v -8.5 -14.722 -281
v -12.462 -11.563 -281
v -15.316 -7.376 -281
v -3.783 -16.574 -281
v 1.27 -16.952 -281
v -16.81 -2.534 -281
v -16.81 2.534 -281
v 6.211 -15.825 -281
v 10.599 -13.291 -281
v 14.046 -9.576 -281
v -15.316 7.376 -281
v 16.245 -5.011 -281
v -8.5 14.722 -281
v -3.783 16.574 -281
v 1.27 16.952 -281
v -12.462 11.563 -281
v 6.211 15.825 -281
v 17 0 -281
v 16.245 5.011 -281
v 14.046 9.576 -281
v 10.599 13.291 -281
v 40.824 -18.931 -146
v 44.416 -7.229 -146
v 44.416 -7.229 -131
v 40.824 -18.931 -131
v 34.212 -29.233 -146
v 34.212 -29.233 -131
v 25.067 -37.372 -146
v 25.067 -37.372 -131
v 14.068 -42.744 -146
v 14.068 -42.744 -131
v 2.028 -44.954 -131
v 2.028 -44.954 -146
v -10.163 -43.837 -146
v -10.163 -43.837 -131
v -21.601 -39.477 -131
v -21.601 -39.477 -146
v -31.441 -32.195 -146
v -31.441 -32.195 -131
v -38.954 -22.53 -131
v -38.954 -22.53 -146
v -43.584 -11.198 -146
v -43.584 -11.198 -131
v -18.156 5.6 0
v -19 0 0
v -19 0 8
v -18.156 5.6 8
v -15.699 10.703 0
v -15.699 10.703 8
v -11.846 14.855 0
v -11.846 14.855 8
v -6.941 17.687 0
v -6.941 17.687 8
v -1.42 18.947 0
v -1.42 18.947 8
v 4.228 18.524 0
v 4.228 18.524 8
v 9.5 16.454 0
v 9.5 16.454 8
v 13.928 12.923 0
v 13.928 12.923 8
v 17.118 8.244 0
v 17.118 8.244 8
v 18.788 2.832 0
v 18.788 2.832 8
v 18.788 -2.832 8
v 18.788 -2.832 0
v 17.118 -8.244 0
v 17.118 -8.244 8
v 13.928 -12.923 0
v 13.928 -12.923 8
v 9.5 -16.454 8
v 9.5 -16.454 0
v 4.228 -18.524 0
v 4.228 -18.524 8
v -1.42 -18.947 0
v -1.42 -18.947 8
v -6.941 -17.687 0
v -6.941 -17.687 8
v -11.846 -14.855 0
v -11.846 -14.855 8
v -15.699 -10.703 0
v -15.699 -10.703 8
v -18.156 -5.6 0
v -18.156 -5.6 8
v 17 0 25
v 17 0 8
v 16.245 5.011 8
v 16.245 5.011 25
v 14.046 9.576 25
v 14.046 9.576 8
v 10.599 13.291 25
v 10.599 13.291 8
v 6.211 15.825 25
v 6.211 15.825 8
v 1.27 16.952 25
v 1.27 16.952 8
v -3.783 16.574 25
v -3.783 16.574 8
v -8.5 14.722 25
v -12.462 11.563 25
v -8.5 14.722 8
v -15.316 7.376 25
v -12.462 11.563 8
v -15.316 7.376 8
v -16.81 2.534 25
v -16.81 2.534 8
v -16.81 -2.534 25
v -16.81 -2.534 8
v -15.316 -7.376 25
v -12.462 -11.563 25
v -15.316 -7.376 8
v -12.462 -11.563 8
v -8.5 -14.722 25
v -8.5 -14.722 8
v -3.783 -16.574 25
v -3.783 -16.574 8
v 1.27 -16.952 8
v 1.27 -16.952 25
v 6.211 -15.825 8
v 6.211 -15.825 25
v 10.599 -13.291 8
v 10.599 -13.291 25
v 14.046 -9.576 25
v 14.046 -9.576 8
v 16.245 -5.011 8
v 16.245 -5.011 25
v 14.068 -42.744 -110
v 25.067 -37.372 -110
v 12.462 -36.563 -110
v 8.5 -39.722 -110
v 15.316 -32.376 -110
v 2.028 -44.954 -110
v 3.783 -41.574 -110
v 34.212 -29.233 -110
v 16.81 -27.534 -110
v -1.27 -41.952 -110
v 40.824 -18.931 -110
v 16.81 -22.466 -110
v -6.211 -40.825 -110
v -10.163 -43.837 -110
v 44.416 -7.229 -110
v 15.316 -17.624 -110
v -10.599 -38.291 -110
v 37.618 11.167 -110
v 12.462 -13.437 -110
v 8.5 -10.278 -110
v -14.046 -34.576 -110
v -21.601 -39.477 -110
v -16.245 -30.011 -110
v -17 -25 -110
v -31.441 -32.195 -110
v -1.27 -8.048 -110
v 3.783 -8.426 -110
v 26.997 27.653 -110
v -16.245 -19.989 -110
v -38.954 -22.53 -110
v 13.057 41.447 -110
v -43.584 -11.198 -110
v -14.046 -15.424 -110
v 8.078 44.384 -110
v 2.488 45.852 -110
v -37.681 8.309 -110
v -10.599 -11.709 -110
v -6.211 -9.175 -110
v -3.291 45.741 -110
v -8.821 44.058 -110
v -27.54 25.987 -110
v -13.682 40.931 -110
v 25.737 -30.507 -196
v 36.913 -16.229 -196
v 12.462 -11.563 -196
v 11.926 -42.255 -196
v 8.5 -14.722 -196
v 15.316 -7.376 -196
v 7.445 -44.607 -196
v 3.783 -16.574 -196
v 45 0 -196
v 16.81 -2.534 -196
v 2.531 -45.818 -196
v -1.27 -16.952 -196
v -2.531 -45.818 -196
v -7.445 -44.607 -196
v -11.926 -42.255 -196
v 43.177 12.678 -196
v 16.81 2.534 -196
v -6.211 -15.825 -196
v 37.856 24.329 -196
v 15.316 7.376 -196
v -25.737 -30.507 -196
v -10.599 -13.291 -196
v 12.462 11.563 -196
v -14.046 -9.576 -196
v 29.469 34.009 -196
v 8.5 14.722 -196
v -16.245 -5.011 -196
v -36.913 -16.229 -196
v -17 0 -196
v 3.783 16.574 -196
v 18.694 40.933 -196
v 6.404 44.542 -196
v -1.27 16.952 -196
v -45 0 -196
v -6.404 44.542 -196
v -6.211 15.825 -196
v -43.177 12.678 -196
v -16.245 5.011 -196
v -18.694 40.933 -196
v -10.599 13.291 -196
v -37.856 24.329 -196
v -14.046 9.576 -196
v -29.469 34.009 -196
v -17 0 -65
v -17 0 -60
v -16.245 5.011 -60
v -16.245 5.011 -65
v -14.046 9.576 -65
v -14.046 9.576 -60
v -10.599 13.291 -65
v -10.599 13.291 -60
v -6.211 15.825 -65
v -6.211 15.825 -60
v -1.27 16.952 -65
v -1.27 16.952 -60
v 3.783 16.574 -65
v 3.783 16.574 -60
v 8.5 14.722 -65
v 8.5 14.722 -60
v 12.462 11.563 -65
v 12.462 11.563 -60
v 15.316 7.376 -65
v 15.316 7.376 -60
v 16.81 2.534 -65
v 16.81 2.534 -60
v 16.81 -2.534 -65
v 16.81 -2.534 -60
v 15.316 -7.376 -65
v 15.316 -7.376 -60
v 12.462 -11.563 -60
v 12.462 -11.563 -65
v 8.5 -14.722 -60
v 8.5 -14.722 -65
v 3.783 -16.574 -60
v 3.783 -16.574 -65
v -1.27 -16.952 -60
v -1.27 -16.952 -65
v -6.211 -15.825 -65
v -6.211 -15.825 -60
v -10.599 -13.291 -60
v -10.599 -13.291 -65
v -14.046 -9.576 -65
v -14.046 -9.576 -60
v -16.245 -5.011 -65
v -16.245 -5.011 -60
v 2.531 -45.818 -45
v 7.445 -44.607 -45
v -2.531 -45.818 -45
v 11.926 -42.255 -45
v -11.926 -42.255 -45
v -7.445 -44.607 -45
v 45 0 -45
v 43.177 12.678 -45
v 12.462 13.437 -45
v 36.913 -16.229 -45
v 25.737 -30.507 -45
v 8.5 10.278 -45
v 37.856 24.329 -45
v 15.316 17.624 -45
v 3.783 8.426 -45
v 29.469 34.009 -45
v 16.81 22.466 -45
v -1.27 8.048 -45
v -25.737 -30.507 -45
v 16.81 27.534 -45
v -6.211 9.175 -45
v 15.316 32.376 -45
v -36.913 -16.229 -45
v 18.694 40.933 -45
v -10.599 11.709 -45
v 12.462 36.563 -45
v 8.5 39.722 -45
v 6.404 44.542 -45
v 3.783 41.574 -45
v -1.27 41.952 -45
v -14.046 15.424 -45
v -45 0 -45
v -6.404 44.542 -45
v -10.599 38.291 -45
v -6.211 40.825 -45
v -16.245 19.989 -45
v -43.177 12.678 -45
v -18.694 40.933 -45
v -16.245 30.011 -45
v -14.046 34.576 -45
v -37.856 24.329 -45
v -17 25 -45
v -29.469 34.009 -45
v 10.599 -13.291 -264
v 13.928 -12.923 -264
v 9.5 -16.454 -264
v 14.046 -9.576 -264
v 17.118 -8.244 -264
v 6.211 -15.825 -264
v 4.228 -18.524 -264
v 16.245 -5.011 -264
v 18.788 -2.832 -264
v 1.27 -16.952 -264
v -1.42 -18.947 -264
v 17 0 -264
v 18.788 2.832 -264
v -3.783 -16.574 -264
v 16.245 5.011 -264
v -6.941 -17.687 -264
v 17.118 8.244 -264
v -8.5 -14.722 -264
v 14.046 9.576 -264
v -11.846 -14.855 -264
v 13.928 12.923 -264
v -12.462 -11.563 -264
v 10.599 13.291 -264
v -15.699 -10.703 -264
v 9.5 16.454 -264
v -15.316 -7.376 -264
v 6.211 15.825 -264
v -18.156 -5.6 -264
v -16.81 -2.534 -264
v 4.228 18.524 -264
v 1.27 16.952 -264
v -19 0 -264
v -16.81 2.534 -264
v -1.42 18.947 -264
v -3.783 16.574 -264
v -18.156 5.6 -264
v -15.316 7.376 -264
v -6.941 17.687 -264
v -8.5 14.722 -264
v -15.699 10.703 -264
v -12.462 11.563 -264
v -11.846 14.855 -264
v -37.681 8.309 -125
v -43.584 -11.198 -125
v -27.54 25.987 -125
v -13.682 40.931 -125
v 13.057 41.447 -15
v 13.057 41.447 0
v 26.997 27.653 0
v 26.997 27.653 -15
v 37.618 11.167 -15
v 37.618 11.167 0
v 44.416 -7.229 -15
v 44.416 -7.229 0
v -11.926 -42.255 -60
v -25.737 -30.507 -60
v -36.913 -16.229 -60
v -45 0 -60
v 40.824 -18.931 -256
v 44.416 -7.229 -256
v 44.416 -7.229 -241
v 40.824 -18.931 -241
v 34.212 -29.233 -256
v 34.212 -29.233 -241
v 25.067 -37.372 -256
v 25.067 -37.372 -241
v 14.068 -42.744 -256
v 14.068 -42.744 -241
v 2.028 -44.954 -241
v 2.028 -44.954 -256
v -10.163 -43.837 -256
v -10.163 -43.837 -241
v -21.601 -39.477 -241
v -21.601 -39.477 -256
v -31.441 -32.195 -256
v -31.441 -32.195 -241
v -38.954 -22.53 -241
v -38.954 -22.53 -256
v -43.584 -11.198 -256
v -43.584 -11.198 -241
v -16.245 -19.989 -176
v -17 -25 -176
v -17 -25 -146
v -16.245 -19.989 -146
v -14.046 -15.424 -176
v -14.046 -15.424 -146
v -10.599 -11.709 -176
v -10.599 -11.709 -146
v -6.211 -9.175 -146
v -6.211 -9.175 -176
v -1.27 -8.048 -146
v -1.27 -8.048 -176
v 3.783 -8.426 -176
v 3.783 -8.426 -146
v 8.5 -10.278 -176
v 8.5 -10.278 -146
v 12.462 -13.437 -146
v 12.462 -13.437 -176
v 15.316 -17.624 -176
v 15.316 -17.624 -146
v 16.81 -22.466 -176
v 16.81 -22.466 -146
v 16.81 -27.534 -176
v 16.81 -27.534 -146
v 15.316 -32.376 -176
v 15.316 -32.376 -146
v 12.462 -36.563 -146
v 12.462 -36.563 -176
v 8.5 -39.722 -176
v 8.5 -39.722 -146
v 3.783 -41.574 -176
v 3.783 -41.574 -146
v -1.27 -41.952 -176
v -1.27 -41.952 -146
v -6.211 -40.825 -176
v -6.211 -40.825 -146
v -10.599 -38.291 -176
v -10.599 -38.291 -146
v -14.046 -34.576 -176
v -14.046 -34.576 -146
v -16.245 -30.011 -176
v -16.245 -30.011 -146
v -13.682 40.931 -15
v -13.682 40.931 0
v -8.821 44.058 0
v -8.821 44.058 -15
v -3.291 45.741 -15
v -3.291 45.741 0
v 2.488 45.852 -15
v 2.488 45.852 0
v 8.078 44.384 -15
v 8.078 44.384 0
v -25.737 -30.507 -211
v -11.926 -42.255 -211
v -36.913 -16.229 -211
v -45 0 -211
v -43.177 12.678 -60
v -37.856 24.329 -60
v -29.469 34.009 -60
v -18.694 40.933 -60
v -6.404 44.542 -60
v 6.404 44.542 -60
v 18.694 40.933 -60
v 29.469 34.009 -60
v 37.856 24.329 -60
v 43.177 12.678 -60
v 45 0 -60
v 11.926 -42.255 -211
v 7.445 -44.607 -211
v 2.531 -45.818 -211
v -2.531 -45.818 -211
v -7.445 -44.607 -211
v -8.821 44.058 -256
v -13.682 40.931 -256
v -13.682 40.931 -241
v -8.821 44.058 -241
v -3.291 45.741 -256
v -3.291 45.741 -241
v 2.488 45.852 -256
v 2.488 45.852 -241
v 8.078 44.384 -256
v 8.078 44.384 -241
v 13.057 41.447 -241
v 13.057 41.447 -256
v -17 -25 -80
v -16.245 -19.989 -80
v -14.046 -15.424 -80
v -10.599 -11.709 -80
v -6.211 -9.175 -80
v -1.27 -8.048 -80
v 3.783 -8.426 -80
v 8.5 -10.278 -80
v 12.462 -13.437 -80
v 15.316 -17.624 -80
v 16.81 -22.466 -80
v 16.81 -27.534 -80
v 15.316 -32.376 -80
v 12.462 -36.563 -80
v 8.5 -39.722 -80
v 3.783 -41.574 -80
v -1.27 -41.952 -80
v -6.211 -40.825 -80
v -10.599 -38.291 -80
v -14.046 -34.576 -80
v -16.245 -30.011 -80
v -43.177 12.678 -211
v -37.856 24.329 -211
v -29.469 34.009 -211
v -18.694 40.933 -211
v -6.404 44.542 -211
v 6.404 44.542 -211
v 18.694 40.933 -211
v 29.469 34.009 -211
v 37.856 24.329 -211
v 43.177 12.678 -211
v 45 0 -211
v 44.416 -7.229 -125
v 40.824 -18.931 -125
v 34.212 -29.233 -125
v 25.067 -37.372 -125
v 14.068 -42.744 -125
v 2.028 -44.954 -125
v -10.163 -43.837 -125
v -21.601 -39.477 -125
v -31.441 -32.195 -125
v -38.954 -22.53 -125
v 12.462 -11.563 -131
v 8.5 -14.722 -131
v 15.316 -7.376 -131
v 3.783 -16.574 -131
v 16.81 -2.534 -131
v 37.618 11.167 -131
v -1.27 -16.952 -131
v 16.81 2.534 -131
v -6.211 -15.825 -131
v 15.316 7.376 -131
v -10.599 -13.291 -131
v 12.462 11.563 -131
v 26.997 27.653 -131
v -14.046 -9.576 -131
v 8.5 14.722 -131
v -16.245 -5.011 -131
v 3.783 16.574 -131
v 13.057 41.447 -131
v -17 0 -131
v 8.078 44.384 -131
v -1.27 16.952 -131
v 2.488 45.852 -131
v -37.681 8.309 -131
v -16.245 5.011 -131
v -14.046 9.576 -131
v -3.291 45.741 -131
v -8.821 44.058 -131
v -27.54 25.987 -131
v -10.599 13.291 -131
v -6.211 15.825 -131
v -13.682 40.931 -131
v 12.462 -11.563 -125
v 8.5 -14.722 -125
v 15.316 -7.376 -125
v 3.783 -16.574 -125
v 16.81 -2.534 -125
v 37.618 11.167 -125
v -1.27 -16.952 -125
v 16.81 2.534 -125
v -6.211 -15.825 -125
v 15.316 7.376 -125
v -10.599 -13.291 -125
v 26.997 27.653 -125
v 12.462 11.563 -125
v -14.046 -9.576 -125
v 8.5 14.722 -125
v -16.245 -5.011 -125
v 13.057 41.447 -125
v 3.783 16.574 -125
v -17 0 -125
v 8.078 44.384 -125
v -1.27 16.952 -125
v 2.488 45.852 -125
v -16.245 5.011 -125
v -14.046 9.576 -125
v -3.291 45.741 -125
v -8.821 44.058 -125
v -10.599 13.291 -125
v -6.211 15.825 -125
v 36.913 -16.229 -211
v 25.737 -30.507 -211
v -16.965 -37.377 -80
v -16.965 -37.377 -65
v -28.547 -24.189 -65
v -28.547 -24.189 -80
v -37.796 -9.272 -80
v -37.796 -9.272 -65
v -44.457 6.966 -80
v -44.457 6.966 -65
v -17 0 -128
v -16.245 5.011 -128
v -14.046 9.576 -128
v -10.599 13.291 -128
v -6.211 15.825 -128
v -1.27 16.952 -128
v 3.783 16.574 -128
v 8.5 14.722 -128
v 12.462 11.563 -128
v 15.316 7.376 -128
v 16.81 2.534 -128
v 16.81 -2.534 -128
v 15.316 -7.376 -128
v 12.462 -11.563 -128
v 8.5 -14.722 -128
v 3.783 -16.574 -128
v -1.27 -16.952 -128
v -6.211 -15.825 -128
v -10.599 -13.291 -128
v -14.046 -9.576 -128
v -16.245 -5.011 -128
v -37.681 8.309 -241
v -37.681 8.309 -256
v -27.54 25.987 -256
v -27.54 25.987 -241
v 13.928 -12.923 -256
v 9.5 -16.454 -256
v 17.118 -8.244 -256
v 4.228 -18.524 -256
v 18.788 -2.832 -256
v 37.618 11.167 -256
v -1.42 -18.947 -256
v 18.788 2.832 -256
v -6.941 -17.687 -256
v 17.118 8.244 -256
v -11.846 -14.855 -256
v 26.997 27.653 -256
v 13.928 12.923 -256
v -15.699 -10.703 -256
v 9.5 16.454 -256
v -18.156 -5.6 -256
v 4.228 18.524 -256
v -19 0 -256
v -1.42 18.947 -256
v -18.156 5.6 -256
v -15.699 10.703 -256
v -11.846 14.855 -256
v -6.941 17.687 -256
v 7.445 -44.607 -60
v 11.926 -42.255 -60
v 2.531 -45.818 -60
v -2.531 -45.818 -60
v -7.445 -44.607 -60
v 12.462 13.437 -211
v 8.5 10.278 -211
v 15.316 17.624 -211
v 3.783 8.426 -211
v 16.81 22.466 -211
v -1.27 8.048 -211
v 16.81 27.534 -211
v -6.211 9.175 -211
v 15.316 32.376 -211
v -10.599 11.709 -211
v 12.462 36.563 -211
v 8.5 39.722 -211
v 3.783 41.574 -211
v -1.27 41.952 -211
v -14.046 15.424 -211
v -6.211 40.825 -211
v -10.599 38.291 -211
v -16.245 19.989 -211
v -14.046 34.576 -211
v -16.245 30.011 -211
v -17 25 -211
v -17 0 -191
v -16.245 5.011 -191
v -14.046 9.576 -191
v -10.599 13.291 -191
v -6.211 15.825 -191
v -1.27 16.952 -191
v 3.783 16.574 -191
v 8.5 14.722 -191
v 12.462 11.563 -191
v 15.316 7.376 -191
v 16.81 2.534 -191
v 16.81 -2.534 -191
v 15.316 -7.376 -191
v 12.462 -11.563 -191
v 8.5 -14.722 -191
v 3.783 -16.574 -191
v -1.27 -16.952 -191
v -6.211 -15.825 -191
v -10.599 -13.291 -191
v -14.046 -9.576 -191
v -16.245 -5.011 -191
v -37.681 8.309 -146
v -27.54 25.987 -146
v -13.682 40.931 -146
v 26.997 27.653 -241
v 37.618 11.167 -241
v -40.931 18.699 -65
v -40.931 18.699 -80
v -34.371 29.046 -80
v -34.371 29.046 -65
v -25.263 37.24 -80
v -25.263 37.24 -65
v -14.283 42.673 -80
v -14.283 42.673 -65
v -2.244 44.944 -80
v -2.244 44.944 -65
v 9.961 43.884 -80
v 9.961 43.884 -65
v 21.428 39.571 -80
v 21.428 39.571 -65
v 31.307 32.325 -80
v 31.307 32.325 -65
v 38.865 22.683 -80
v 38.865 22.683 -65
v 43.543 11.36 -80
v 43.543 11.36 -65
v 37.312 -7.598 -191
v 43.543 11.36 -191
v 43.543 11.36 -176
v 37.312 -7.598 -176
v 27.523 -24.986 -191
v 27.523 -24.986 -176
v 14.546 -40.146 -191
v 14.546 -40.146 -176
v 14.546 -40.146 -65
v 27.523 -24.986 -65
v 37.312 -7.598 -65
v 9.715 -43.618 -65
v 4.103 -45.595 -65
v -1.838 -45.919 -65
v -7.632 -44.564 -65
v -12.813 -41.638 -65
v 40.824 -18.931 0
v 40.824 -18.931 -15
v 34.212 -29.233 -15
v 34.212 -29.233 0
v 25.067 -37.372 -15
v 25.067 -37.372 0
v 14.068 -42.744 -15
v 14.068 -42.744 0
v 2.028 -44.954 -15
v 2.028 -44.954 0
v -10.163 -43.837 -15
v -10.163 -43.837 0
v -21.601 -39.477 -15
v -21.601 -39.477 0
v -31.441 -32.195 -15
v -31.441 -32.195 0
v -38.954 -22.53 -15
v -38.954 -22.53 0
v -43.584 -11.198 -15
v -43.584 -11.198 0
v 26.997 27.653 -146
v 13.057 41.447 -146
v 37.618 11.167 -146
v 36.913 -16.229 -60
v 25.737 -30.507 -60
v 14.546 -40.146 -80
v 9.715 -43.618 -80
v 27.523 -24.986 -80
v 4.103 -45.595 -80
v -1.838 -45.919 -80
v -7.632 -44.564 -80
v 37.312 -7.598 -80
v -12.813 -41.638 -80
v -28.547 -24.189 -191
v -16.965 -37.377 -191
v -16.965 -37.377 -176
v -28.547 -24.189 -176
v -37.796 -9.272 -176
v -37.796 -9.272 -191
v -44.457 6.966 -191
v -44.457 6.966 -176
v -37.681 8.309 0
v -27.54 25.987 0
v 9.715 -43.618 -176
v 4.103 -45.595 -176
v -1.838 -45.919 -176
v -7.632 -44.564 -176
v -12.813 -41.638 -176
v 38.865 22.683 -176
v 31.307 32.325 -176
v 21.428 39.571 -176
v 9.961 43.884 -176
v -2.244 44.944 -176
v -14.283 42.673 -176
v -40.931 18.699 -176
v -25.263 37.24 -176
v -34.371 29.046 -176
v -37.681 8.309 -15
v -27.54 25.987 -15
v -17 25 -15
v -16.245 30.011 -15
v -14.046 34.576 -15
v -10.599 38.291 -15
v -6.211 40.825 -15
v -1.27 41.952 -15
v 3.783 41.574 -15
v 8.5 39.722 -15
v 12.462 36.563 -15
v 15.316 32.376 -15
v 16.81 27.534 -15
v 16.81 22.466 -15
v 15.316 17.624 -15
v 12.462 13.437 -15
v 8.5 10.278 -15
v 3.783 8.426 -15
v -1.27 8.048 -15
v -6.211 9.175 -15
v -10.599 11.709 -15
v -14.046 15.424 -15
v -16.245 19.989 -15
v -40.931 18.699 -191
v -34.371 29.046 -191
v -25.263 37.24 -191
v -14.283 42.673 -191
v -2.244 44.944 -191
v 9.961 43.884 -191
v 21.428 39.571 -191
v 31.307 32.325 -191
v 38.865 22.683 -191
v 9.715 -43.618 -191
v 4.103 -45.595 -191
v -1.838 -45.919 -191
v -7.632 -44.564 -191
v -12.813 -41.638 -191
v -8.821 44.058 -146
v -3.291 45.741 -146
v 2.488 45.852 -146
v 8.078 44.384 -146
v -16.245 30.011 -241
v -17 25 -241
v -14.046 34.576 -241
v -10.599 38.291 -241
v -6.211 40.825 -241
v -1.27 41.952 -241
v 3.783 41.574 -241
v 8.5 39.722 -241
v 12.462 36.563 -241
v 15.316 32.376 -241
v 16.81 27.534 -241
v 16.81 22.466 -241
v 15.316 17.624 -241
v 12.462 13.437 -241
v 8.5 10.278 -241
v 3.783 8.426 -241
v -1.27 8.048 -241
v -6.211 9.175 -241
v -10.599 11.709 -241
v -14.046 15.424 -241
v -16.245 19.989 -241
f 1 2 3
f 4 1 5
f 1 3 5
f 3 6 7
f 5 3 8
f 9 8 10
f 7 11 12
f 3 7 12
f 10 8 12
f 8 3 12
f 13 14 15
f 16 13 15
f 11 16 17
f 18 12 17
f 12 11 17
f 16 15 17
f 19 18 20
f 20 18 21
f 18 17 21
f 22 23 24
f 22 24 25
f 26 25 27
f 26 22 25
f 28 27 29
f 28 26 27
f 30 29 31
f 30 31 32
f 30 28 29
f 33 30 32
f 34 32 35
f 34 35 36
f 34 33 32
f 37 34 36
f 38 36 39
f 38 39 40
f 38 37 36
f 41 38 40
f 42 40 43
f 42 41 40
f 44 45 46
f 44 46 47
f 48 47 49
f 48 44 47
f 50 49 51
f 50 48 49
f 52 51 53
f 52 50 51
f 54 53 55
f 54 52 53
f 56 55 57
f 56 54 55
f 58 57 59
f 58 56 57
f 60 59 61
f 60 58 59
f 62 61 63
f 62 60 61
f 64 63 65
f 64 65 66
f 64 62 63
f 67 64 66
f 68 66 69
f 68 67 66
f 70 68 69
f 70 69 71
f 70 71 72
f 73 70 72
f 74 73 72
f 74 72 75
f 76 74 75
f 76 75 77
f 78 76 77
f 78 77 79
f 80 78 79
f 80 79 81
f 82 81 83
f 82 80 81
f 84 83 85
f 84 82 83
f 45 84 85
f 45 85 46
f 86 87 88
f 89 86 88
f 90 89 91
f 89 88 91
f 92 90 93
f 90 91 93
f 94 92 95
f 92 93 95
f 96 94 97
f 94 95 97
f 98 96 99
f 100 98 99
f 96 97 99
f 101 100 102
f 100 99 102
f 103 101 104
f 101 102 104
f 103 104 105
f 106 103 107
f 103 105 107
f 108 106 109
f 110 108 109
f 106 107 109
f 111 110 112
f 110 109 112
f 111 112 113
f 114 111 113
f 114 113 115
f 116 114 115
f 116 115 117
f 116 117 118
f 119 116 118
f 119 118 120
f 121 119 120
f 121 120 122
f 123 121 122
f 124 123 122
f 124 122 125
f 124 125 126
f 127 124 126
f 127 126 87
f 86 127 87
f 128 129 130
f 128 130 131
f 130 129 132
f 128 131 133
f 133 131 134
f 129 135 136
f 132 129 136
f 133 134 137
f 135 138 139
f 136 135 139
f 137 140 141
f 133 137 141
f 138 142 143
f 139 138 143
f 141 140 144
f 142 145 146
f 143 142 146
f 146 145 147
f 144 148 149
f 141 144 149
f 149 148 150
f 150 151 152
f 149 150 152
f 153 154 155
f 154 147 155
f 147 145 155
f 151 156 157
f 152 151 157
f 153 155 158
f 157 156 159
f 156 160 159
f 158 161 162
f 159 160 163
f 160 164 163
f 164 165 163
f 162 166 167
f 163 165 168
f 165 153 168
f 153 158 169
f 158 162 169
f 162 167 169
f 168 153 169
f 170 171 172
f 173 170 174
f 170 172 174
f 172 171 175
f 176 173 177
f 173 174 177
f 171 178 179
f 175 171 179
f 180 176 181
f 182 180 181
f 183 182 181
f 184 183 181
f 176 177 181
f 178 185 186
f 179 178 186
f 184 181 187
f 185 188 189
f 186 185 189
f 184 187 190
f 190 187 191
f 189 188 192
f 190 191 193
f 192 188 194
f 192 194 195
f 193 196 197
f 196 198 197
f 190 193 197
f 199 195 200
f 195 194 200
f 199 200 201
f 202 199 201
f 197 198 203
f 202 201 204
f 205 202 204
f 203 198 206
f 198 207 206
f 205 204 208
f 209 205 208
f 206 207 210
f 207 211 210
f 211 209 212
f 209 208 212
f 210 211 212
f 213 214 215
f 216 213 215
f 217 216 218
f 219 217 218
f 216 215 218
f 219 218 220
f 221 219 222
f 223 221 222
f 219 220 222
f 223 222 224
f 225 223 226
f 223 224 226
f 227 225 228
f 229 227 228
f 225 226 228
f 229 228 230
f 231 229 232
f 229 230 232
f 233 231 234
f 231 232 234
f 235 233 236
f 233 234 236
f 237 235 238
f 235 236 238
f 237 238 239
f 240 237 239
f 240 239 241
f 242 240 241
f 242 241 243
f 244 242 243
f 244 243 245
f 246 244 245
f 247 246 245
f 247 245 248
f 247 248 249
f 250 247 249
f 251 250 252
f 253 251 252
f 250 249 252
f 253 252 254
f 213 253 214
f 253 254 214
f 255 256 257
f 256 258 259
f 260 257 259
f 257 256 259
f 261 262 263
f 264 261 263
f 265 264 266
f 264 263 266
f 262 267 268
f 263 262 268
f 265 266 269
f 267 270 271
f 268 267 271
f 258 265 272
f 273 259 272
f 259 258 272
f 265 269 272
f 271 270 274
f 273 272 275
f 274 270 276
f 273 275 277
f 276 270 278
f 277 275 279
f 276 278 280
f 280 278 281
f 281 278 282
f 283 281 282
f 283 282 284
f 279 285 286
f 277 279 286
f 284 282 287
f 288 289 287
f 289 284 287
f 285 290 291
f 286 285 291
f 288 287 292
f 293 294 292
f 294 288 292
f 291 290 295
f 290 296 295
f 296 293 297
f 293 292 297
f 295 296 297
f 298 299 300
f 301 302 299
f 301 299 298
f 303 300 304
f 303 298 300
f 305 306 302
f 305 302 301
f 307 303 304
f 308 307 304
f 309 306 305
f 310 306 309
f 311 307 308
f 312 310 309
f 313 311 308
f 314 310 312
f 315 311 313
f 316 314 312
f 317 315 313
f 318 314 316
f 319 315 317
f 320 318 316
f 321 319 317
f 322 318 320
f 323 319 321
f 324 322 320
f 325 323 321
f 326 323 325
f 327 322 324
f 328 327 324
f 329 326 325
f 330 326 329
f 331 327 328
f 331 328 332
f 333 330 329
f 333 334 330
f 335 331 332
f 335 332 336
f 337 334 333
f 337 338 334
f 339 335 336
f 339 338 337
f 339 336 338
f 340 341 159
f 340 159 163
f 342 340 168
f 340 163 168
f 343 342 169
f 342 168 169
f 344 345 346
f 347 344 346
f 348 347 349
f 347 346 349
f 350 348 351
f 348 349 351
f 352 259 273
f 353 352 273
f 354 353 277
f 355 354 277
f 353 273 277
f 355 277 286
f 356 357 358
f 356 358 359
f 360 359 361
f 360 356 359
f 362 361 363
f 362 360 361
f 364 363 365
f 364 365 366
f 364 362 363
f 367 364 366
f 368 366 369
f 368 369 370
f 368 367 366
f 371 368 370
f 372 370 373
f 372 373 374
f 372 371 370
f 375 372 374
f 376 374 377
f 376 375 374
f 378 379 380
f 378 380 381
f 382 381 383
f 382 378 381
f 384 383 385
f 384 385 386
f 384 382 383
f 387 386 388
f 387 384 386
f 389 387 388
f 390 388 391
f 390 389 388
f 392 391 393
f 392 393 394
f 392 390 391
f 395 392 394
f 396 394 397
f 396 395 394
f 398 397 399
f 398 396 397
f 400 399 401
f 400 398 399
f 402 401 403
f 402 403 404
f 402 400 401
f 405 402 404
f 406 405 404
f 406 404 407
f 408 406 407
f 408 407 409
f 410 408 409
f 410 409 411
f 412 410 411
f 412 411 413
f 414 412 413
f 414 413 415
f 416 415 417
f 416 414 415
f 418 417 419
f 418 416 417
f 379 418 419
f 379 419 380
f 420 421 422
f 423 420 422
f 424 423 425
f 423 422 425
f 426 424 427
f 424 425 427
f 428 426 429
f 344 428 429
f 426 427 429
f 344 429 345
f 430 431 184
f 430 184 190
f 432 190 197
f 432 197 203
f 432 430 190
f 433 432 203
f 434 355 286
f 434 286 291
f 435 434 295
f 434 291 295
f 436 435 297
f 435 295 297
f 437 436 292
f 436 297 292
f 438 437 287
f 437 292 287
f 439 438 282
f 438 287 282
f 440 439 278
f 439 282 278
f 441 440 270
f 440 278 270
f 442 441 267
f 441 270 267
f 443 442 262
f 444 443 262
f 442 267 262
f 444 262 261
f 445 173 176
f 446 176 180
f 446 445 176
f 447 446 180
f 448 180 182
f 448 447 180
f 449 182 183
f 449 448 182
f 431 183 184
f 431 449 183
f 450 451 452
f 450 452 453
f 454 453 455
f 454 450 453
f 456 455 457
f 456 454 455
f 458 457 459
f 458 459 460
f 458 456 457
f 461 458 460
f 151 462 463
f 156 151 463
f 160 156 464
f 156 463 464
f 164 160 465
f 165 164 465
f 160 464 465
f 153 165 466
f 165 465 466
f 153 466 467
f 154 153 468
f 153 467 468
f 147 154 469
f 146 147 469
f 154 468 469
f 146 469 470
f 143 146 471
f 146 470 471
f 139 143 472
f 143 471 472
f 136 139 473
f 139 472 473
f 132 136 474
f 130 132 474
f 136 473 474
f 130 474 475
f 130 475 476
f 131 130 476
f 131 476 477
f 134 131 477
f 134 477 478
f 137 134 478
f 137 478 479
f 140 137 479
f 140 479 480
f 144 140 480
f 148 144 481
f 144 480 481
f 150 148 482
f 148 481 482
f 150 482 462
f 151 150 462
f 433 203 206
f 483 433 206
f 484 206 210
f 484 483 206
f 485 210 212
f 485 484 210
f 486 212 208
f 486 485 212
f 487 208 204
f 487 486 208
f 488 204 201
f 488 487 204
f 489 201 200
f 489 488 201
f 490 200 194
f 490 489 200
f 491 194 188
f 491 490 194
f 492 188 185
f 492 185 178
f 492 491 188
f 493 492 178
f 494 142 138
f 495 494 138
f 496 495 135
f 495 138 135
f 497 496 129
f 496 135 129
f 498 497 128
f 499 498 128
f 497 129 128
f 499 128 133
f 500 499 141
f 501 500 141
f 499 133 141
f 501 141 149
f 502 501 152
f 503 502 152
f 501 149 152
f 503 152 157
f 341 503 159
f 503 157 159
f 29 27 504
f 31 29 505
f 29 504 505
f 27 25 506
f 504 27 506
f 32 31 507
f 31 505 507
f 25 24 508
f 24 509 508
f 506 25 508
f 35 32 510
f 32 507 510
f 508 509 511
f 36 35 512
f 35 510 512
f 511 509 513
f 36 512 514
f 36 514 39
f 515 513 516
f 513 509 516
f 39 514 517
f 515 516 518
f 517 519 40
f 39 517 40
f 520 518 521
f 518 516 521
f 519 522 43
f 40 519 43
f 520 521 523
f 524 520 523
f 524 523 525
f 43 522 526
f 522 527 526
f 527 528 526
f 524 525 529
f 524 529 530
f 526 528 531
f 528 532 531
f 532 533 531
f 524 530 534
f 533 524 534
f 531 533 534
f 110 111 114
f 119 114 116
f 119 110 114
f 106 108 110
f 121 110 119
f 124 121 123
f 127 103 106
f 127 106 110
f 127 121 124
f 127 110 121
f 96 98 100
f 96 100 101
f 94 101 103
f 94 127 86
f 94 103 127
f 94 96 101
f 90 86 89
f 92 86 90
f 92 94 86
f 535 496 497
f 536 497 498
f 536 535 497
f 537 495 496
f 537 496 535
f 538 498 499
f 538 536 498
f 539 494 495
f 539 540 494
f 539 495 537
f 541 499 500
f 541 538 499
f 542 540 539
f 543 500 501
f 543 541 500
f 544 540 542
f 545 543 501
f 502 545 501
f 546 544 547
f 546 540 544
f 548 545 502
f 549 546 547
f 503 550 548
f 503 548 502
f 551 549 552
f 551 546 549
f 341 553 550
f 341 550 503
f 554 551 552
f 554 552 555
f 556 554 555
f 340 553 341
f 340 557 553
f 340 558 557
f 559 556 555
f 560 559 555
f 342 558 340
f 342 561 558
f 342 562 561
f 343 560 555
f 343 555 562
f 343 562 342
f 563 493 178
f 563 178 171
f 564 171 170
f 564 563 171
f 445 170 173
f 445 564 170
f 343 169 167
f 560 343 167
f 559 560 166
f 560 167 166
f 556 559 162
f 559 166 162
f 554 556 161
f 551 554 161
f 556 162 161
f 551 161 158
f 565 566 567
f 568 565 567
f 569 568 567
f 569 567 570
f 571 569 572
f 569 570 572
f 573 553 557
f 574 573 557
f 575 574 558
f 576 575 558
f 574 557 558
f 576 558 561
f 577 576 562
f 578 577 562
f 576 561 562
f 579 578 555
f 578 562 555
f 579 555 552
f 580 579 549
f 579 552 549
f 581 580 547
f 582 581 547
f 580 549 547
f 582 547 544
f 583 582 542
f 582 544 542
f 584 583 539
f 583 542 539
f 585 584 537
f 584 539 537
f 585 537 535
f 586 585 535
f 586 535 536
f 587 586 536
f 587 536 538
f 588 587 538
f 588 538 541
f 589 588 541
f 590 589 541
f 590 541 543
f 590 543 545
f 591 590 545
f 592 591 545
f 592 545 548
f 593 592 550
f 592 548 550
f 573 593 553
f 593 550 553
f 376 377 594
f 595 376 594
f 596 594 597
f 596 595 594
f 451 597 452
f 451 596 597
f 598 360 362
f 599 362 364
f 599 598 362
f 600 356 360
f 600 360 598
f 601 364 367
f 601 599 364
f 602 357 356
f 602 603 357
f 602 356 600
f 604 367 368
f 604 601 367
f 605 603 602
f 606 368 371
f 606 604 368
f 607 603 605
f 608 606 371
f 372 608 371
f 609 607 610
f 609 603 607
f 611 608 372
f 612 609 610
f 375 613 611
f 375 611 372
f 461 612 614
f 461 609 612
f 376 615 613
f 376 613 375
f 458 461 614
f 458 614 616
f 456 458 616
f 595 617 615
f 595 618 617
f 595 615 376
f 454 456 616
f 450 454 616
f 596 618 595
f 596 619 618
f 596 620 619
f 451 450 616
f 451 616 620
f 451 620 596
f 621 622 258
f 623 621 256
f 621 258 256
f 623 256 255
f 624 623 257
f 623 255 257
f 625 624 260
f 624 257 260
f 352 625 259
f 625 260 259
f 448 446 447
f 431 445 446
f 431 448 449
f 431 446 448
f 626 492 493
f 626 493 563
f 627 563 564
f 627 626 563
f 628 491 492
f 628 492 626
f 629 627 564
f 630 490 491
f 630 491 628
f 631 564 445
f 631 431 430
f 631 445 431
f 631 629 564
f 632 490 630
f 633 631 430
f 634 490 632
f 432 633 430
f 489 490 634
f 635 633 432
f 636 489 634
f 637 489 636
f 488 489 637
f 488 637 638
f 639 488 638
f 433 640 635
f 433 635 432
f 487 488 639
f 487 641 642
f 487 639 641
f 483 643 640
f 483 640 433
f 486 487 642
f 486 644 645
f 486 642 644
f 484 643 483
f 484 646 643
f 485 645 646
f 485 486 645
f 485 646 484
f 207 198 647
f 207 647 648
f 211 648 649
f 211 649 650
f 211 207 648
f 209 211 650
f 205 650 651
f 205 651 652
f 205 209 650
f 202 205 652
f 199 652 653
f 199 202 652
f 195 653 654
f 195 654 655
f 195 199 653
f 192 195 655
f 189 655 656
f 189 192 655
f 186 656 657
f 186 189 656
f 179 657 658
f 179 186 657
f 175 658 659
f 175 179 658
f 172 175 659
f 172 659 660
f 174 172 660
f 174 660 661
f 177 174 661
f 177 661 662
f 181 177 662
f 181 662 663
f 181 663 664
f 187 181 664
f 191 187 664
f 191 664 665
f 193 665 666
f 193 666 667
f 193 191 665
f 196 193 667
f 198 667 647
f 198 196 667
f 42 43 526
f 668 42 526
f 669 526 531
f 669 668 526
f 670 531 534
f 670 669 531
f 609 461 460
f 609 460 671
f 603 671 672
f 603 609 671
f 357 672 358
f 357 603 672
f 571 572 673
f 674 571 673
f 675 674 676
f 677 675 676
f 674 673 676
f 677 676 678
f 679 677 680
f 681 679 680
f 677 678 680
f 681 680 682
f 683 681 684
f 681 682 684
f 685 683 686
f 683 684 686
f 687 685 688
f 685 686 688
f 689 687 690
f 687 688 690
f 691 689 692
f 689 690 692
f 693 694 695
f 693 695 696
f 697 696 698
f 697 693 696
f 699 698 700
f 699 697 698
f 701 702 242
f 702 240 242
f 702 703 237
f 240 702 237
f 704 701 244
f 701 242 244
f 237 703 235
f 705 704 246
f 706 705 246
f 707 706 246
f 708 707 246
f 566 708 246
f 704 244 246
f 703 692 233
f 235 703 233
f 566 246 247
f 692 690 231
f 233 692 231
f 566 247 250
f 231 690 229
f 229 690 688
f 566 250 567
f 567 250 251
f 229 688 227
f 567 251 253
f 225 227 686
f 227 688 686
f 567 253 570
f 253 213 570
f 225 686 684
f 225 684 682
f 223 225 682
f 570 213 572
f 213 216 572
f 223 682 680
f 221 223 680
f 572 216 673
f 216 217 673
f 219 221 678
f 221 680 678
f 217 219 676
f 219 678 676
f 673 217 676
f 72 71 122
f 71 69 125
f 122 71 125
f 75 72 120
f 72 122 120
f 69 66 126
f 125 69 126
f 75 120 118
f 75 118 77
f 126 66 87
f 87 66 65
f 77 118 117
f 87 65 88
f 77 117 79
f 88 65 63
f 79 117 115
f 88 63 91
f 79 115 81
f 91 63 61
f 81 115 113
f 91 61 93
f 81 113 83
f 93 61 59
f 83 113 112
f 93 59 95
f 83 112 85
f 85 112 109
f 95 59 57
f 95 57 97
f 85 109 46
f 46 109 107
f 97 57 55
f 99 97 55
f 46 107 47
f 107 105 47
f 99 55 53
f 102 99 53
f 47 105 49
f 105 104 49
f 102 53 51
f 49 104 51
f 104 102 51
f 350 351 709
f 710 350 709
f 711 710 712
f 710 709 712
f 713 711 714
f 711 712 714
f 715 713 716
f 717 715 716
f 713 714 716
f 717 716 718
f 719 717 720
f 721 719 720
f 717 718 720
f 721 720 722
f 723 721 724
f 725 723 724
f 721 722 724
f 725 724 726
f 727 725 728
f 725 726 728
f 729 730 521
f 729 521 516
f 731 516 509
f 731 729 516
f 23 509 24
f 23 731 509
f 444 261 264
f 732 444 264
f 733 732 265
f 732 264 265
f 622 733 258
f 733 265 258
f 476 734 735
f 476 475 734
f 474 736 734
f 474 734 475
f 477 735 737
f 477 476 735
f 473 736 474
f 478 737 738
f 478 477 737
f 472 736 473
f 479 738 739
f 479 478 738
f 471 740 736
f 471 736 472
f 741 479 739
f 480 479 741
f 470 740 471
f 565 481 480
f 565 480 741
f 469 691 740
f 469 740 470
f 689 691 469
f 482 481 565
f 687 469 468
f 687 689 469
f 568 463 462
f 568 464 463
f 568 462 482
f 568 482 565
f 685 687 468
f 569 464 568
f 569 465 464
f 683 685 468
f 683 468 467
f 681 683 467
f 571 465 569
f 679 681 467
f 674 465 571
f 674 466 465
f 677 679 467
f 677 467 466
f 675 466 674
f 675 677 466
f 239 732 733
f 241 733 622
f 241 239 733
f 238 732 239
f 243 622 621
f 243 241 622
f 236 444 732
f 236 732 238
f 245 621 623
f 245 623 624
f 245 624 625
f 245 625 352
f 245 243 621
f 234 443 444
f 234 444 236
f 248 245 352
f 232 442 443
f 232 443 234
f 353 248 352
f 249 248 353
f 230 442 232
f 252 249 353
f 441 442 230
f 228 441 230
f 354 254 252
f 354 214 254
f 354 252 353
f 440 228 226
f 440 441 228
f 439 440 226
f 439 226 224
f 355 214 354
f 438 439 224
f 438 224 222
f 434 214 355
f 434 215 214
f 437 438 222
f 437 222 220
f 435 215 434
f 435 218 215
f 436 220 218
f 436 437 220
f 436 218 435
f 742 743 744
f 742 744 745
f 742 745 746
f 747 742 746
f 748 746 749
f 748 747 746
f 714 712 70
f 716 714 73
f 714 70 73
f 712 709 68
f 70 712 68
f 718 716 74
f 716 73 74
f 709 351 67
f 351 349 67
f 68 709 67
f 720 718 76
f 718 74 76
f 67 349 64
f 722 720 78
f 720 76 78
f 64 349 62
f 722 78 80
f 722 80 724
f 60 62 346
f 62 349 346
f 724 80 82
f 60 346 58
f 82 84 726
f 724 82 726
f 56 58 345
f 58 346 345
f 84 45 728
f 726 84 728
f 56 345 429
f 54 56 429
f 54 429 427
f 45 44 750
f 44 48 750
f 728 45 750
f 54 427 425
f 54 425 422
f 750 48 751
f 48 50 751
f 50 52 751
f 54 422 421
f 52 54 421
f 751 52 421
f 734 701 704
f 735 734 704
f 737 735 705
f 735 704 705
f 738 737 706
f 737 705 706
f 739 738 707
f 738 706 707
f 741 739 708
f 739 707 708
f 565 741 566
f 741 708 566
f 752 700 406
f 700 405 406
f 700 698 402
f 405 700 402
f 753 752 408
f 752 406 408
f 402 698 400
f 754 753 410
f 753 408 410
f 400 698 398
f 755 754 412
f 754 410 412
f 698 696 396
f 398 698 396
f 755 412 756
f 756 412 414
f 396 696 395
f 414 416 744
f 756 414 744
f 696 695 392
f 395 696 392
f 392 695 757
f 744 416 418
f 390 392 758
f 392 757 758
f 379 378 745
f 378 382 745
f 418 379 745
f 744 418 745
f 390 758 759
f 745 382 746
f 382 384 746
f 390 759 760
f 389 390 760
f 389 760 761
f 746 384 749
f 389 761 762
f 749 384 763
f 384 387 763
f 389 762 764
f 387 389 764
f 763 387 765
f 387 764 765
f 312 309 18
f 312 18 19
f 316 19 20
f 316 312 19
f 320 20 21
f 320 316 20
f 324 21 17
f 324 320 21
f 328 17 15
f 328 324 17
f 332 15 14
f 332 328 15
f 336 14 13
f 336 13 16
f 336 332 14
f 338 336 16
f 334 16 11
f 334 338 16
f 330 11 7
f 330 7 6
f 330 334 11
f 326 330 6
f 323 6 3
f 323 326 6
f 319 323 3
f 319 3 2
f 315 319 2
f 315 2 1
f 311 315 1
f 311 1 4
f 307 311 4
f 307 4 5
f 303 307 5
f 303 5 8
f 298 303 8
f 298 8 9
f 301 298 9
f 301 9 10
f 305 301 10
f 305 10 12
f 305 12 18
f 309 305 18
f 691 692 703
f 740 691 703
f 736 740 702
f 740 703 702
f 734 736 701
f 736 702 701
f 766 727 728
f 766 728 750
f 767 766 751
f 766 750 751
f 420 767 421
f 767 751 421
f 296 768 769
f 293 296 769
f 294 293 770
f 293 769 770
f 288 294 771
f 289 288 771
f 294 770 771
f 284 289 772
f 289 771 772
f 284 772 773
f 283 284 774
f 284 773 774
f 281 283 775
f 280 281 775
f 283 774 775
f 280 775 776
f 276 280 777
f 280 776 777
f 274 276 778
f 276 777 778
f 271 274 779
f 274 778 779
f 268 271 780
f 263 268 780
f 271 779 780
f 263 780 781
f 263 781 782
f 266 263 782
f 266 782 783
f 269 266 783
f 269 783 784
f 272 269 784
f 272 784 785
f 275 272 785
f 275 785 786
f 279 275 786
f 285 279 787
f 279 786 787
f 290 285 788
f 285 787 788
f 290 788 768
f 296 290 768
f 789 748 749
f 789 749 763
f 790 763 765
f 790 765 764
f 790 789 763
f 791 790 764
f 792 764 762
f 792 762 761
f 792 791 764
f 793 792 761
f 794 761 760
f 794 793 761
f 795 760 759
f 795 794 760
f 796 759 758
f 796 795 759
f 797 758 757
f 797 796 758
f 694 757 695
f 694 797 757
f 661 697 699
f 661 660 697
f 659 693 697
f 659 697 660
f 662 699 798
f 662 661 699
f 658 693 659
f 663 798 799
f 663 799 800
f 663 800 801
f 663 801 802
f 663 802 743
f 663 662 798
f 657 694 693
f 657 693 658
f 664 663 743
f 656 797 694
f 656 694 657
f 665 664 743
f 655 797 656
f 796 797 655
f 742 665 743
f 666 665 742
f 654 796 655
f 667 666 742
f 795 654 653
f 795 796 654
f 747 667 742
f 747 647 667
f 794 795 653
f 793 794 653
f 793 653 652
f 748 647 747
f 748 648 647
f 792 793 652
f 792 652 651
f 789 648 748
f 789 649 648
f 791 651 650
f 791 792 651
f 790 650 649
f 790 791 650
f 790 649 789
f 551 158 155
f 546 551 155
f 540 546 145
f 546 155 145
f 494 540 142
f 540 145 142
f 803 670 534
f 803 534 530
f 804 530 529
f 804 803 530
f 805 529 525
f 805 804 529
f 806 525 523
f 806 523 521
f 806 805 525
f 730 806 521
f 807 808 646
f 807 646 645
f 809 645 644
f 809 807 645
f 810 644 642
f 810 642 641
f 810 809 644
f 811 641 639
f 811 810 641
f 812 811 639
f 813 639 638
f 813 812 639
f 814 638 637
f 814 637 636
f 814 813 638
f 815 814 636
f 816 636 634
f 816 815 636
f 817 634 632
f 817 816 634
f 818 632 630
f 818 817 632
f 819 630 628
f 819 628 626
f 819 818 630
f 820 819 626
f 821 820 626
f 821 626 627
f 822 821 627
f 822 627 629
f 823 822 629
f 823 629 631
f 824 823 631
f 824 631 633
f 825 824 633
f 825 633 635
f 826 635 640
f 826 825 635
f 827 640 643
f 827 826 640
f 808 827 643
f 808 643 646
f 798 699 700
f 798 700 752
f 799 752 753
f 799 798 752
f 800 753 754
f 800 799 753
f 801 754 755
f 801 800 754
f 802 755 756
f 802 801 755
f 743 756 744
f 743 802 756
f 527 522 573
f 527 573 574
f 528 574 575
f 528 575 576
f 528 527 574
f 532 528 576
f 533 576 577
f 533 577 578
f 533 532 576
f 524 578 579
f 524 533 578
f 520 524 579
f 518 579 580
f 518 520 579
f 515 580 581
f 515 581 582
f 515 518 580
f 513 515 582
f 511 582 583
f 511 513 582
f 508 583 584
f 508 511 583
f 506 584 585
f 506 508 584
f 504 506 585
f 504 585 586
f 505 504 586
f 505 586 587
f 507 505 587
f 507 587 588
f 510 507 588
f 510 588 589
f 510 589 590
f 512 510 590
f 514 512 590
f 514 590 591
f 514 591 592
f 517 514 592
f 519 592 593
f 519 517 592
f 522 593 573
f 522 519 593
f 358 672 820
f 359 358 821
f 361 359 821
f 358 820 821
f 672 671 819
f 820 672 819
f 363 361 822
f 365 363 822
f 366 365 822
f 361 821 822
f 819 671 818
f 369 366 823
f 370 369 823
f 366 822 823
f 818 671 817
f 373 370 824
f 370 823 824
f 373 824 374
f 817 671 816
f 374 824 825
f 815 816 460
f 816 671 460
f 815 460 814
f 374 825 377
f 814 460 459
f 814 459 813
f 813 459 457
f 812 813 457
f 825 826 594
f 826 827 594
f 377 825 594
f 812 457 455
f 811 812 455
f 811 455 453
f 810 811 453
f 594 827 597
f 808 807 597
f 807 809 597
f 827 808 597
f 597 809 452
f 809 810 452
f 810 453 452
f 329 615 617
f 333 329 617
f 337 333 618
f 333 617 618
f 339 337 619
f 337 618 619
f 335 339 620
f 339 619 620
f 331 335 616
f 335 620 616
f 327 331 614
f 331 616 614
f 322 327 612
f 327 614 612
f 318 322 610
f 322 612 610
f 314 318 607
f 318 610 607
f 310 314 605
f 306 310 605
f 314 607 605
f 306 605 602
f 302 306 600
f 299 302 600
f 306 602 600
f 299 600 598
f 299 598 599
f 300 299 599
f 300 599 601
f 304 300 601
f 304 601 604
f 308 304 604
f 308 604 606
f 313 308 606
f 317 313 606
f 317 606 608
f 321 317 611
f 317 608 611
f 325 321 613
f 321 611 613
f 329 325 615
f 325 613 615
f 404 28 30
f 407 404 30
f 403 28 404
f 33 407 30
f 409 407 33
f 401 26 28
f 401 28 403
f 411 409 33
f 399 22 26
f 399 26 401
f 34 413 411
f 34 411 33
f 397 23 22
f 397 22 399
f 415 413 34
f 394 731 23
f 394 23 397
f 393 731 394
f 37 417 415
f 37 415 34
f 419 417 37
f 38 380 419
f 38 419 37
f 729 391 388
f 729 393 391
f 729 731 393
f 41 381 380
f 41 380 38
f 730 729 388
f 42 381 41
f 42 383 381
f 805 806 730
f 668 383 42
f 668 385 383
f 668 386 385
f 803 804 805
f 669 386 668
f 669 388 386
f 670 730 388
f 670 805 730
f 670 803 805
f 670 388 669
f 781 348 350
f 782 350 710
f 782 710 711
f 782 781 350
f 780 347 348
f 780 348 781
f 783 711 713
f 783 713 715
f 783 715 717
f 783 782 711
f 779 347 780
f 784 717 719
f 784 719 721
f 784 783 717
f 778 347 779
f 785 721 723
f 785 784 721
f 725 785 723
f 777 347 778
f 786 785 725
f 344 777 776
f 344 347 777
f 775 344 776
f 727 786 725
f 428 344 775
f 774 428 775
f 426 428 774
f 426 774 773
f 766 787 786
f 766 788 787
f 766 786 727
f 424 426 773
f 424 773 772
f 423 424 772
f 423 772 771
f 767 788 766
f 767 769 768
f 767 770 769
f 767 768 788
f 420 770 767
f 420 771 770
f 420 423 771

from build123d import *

# Parameters (mm, degrees)
IZIM1_R                      = 17
Y_KSEKLIK_EKSTR_ZYON1_DEPTH  = 25
IZIM2_R                      = 19
Y_KSEKLIK_EKSTR_ZYON2_DEPTH  = 8
Y_KSEKLIK_EKSTR_ZYON3_DEPTH  = 15
IZIM4_R                      = 17
Y_KSEKLIK_EKSTR_ZYON4_DEPTH  = 30
Y_KSEKLIK_EKSTR_ZYON5_DEPTH  = 15
IZIM6_R                      = 17
Y_KSEKLIK_EKSTR_ZYON6_DEPTH  = 5
Y_KSEKLIK_EKSTR_ZYON7_DEPTH  = 15
IZIM9_R                      = 17
Y_KSEKLIK_EKSTR_ZYON8_DEPTH  = 30
Y_KSEKLIK_EKSTR_ZYON9_DEPTH  = 15
IZIM12_R                     = 17
Y_KSEKLIK_EKSTR_ZYON10_DEPTH = 3


with BuildPart() as part:
    # Çizim1 → Yükseklik-Ekstrüzyon1 (new body)
    with BuildSketch(Plane.XY):
        Circle(IZIM1_R)
    extrude(amount=Y_KSEKLIK_EKSTR_ZYON1_DEPTH)

    # Çizim2 → Yükseklik-Ekstrüzyon2 (add)
    with BuildSketch(Plane(origin=(0, 0, 0), x_dir=(-1, 0, 0), z_dir=(0, 0, -1))):
        Circle(IZIM2_R)
    extrude(amount=-Y_KSEKLIK_EKSTR_ZYON2_DEPTH)

    # Çizim3 → Yükseklik-Ekstrüzyon3 (add)
    with BuildSketch(Plane(origin=(0, 0, 0), x_dir=(-1, 0, 0), z_dir=(0, 0, -1))):
        with BuildLine():
            ThreePointArc((-44.415603771, -7.228702626), (-2.027811095, -44.954287695), (43.584396229, -11.198232242))
            ThreePointArc((43.584396229, -11.198232242), (33.112866367, 17.436067755), (13.682042331, 40.931155566))
            ThreePointArc((13.682042331, 40.931155566), (0.405418694, 45.996086199), (-13.05683546, 41.447463263))
            ThreePointArc((-13.05683546, 41.447463263), (-32.757662874, 19.700124785), (-44.415603771, -7.228702626))
        make_face()
    extrude(amount=Y_KSEKLIK_EKSTR_ZYON3_DEPTH)

    # Çizim4 → Yükseklik-Ekstrüzyon4 (add)
    with BuildSketch(Plane(origin=(0, 0, -15), x_dir=(-1, 0, 0), z_dir=(0, 0, -1))):
        with Locations((0, 25)):
            Circle(IZIM4_R)
    extrude(amount=Y_KSEKLIK_EKSTR_ZYON4_DEPTH)

    # Çizim5 → Yükseklik-Ekstrüzyon5 (add)
    with BuildSketch(Plane(origin=(0, 0, -45), x_dir=(-1, 0, 0), z_dir=(0, 0, -1))):
        with BuildLine():
            ThreePointArc((45, 0), (0, 45), (-45, 0))
            ThreePointArc((-45, 0), (-31.68561215, -23.649975334), (-11.926296118, -42.255449988))
            ThreePointArc((-11.926296118, -42.255449988), (0, -45.97067458), (11.926296118, -42.255449988))
            ThreePointArc((11.926296118, -42.255449988), (31.68561215, -23.649975334), (45, 0))
        make_face()
    extrude(amount=Y_KSEKLIK_EKSTR_ZYON5_DEPTH)

    # Çizim6 → Yükseklik-Ekstrüzyon6 (add)
    with BuildSketch(Plane(origin=(0, 0, -60), x_dir=(-1, 0, 0), z_dir=(0, 0, -1))):
        Circle(IZIM6_R)
    extrude(amount=Y_KSEKLIK_EKSTR_ZYON6_DEPTH)

    # Çizim7 → Yükseklik-Ekstrüzyon7 (add)
    with BuildSketch(Plane(origin=(0, 0, -65), x_dir=(-1, 0, 0), z_dir=(0, 0, -1))):
        with BuildLine():
            ThreePointArc((44.457488298, 6.966472151), (2.243897169, 44.944019908), (-43.542511702, 11.360003287))
            ThreePointArc((-43.542511702, 11.360003287), (-32.842453707, -16.531076412), (-14.546498608, -40.145936031))
            ThreePointArc((-14.546498608, -40.145936031), (1.83841745, -45.919374304), (16.965213719, -37.376652353))
            ThreePointArc((16.965213719, -37.376652353), (33.480341406, -16.921835259), (44.457488298, 6.966472151))
        make_face()
    extrude(amount=Y_KSEKLIK_EKSTR_ZYON7_DEPTH)

    # Çizim9 → Yükseklik-Ekstrüzyon8 (add)
    with BuildSketch(Plane(origin=(0, 0, -80), x_dir=(-1, 0, 0), z_dir=(0, 0, -1))):
        with Locations((0, -25)):
            Circle(IZIM9_R)
    extrude(amount=Y_KSEKLIK_EKSTR_ZYON8_DEPTH)

    # Çizim10 → Yükseklik-Ekstrüzyon9 (add)
    with BuildSketch(Plane(origin=(0, 0, -110), x_dir=(-1, 0, 0), z_dir=(0, 0, -1))):
        with BuildLine():
            ThreePointArc((-44.415603771, -7.228702626), (-2.027811095, -44.954287695), (43.584396229, -11.198232242))
            ThreePointArc((43.584396229, -11.198232242), (33.112866367, 17.436067755), (13.682042331, 40.931155566))
            ThreePointArc((13.682042331, 40.931155566), (0.405418694, 45.996086199), (-13.05683546, 41.447463263))
            ThreePointArc((-13.05683546, 41.447463263), (-32.757662874, 19.700124785), (-44.415603771, -7.228702626))
        make_face()
    extrude(amount=Y_KSEKLIK_EKSTR_ZYON9_DEPTH)

    # Çizim12 → Yükseklik-Ekstrüzyon10 (add)
    with BuildSketch(Plane(origin=(0, 0, -125), x_dir=(-1, 0, 0), z_dir=(0, 0, -1))):
        Circle(IZIM12_R)
    extrude(amount=Y_KSEKLIK_EKSTR_ZYON10_DEPTH)

    # Aynalama1: part across plane


with BuildPart() as part_1:
    add(part.part)
    add(part.part.mirror(Plane(origin=(0, 0, -128), x_dir=(1, 0, 0), z_dir=(0, 0, -1))))


solid = part_1.part
